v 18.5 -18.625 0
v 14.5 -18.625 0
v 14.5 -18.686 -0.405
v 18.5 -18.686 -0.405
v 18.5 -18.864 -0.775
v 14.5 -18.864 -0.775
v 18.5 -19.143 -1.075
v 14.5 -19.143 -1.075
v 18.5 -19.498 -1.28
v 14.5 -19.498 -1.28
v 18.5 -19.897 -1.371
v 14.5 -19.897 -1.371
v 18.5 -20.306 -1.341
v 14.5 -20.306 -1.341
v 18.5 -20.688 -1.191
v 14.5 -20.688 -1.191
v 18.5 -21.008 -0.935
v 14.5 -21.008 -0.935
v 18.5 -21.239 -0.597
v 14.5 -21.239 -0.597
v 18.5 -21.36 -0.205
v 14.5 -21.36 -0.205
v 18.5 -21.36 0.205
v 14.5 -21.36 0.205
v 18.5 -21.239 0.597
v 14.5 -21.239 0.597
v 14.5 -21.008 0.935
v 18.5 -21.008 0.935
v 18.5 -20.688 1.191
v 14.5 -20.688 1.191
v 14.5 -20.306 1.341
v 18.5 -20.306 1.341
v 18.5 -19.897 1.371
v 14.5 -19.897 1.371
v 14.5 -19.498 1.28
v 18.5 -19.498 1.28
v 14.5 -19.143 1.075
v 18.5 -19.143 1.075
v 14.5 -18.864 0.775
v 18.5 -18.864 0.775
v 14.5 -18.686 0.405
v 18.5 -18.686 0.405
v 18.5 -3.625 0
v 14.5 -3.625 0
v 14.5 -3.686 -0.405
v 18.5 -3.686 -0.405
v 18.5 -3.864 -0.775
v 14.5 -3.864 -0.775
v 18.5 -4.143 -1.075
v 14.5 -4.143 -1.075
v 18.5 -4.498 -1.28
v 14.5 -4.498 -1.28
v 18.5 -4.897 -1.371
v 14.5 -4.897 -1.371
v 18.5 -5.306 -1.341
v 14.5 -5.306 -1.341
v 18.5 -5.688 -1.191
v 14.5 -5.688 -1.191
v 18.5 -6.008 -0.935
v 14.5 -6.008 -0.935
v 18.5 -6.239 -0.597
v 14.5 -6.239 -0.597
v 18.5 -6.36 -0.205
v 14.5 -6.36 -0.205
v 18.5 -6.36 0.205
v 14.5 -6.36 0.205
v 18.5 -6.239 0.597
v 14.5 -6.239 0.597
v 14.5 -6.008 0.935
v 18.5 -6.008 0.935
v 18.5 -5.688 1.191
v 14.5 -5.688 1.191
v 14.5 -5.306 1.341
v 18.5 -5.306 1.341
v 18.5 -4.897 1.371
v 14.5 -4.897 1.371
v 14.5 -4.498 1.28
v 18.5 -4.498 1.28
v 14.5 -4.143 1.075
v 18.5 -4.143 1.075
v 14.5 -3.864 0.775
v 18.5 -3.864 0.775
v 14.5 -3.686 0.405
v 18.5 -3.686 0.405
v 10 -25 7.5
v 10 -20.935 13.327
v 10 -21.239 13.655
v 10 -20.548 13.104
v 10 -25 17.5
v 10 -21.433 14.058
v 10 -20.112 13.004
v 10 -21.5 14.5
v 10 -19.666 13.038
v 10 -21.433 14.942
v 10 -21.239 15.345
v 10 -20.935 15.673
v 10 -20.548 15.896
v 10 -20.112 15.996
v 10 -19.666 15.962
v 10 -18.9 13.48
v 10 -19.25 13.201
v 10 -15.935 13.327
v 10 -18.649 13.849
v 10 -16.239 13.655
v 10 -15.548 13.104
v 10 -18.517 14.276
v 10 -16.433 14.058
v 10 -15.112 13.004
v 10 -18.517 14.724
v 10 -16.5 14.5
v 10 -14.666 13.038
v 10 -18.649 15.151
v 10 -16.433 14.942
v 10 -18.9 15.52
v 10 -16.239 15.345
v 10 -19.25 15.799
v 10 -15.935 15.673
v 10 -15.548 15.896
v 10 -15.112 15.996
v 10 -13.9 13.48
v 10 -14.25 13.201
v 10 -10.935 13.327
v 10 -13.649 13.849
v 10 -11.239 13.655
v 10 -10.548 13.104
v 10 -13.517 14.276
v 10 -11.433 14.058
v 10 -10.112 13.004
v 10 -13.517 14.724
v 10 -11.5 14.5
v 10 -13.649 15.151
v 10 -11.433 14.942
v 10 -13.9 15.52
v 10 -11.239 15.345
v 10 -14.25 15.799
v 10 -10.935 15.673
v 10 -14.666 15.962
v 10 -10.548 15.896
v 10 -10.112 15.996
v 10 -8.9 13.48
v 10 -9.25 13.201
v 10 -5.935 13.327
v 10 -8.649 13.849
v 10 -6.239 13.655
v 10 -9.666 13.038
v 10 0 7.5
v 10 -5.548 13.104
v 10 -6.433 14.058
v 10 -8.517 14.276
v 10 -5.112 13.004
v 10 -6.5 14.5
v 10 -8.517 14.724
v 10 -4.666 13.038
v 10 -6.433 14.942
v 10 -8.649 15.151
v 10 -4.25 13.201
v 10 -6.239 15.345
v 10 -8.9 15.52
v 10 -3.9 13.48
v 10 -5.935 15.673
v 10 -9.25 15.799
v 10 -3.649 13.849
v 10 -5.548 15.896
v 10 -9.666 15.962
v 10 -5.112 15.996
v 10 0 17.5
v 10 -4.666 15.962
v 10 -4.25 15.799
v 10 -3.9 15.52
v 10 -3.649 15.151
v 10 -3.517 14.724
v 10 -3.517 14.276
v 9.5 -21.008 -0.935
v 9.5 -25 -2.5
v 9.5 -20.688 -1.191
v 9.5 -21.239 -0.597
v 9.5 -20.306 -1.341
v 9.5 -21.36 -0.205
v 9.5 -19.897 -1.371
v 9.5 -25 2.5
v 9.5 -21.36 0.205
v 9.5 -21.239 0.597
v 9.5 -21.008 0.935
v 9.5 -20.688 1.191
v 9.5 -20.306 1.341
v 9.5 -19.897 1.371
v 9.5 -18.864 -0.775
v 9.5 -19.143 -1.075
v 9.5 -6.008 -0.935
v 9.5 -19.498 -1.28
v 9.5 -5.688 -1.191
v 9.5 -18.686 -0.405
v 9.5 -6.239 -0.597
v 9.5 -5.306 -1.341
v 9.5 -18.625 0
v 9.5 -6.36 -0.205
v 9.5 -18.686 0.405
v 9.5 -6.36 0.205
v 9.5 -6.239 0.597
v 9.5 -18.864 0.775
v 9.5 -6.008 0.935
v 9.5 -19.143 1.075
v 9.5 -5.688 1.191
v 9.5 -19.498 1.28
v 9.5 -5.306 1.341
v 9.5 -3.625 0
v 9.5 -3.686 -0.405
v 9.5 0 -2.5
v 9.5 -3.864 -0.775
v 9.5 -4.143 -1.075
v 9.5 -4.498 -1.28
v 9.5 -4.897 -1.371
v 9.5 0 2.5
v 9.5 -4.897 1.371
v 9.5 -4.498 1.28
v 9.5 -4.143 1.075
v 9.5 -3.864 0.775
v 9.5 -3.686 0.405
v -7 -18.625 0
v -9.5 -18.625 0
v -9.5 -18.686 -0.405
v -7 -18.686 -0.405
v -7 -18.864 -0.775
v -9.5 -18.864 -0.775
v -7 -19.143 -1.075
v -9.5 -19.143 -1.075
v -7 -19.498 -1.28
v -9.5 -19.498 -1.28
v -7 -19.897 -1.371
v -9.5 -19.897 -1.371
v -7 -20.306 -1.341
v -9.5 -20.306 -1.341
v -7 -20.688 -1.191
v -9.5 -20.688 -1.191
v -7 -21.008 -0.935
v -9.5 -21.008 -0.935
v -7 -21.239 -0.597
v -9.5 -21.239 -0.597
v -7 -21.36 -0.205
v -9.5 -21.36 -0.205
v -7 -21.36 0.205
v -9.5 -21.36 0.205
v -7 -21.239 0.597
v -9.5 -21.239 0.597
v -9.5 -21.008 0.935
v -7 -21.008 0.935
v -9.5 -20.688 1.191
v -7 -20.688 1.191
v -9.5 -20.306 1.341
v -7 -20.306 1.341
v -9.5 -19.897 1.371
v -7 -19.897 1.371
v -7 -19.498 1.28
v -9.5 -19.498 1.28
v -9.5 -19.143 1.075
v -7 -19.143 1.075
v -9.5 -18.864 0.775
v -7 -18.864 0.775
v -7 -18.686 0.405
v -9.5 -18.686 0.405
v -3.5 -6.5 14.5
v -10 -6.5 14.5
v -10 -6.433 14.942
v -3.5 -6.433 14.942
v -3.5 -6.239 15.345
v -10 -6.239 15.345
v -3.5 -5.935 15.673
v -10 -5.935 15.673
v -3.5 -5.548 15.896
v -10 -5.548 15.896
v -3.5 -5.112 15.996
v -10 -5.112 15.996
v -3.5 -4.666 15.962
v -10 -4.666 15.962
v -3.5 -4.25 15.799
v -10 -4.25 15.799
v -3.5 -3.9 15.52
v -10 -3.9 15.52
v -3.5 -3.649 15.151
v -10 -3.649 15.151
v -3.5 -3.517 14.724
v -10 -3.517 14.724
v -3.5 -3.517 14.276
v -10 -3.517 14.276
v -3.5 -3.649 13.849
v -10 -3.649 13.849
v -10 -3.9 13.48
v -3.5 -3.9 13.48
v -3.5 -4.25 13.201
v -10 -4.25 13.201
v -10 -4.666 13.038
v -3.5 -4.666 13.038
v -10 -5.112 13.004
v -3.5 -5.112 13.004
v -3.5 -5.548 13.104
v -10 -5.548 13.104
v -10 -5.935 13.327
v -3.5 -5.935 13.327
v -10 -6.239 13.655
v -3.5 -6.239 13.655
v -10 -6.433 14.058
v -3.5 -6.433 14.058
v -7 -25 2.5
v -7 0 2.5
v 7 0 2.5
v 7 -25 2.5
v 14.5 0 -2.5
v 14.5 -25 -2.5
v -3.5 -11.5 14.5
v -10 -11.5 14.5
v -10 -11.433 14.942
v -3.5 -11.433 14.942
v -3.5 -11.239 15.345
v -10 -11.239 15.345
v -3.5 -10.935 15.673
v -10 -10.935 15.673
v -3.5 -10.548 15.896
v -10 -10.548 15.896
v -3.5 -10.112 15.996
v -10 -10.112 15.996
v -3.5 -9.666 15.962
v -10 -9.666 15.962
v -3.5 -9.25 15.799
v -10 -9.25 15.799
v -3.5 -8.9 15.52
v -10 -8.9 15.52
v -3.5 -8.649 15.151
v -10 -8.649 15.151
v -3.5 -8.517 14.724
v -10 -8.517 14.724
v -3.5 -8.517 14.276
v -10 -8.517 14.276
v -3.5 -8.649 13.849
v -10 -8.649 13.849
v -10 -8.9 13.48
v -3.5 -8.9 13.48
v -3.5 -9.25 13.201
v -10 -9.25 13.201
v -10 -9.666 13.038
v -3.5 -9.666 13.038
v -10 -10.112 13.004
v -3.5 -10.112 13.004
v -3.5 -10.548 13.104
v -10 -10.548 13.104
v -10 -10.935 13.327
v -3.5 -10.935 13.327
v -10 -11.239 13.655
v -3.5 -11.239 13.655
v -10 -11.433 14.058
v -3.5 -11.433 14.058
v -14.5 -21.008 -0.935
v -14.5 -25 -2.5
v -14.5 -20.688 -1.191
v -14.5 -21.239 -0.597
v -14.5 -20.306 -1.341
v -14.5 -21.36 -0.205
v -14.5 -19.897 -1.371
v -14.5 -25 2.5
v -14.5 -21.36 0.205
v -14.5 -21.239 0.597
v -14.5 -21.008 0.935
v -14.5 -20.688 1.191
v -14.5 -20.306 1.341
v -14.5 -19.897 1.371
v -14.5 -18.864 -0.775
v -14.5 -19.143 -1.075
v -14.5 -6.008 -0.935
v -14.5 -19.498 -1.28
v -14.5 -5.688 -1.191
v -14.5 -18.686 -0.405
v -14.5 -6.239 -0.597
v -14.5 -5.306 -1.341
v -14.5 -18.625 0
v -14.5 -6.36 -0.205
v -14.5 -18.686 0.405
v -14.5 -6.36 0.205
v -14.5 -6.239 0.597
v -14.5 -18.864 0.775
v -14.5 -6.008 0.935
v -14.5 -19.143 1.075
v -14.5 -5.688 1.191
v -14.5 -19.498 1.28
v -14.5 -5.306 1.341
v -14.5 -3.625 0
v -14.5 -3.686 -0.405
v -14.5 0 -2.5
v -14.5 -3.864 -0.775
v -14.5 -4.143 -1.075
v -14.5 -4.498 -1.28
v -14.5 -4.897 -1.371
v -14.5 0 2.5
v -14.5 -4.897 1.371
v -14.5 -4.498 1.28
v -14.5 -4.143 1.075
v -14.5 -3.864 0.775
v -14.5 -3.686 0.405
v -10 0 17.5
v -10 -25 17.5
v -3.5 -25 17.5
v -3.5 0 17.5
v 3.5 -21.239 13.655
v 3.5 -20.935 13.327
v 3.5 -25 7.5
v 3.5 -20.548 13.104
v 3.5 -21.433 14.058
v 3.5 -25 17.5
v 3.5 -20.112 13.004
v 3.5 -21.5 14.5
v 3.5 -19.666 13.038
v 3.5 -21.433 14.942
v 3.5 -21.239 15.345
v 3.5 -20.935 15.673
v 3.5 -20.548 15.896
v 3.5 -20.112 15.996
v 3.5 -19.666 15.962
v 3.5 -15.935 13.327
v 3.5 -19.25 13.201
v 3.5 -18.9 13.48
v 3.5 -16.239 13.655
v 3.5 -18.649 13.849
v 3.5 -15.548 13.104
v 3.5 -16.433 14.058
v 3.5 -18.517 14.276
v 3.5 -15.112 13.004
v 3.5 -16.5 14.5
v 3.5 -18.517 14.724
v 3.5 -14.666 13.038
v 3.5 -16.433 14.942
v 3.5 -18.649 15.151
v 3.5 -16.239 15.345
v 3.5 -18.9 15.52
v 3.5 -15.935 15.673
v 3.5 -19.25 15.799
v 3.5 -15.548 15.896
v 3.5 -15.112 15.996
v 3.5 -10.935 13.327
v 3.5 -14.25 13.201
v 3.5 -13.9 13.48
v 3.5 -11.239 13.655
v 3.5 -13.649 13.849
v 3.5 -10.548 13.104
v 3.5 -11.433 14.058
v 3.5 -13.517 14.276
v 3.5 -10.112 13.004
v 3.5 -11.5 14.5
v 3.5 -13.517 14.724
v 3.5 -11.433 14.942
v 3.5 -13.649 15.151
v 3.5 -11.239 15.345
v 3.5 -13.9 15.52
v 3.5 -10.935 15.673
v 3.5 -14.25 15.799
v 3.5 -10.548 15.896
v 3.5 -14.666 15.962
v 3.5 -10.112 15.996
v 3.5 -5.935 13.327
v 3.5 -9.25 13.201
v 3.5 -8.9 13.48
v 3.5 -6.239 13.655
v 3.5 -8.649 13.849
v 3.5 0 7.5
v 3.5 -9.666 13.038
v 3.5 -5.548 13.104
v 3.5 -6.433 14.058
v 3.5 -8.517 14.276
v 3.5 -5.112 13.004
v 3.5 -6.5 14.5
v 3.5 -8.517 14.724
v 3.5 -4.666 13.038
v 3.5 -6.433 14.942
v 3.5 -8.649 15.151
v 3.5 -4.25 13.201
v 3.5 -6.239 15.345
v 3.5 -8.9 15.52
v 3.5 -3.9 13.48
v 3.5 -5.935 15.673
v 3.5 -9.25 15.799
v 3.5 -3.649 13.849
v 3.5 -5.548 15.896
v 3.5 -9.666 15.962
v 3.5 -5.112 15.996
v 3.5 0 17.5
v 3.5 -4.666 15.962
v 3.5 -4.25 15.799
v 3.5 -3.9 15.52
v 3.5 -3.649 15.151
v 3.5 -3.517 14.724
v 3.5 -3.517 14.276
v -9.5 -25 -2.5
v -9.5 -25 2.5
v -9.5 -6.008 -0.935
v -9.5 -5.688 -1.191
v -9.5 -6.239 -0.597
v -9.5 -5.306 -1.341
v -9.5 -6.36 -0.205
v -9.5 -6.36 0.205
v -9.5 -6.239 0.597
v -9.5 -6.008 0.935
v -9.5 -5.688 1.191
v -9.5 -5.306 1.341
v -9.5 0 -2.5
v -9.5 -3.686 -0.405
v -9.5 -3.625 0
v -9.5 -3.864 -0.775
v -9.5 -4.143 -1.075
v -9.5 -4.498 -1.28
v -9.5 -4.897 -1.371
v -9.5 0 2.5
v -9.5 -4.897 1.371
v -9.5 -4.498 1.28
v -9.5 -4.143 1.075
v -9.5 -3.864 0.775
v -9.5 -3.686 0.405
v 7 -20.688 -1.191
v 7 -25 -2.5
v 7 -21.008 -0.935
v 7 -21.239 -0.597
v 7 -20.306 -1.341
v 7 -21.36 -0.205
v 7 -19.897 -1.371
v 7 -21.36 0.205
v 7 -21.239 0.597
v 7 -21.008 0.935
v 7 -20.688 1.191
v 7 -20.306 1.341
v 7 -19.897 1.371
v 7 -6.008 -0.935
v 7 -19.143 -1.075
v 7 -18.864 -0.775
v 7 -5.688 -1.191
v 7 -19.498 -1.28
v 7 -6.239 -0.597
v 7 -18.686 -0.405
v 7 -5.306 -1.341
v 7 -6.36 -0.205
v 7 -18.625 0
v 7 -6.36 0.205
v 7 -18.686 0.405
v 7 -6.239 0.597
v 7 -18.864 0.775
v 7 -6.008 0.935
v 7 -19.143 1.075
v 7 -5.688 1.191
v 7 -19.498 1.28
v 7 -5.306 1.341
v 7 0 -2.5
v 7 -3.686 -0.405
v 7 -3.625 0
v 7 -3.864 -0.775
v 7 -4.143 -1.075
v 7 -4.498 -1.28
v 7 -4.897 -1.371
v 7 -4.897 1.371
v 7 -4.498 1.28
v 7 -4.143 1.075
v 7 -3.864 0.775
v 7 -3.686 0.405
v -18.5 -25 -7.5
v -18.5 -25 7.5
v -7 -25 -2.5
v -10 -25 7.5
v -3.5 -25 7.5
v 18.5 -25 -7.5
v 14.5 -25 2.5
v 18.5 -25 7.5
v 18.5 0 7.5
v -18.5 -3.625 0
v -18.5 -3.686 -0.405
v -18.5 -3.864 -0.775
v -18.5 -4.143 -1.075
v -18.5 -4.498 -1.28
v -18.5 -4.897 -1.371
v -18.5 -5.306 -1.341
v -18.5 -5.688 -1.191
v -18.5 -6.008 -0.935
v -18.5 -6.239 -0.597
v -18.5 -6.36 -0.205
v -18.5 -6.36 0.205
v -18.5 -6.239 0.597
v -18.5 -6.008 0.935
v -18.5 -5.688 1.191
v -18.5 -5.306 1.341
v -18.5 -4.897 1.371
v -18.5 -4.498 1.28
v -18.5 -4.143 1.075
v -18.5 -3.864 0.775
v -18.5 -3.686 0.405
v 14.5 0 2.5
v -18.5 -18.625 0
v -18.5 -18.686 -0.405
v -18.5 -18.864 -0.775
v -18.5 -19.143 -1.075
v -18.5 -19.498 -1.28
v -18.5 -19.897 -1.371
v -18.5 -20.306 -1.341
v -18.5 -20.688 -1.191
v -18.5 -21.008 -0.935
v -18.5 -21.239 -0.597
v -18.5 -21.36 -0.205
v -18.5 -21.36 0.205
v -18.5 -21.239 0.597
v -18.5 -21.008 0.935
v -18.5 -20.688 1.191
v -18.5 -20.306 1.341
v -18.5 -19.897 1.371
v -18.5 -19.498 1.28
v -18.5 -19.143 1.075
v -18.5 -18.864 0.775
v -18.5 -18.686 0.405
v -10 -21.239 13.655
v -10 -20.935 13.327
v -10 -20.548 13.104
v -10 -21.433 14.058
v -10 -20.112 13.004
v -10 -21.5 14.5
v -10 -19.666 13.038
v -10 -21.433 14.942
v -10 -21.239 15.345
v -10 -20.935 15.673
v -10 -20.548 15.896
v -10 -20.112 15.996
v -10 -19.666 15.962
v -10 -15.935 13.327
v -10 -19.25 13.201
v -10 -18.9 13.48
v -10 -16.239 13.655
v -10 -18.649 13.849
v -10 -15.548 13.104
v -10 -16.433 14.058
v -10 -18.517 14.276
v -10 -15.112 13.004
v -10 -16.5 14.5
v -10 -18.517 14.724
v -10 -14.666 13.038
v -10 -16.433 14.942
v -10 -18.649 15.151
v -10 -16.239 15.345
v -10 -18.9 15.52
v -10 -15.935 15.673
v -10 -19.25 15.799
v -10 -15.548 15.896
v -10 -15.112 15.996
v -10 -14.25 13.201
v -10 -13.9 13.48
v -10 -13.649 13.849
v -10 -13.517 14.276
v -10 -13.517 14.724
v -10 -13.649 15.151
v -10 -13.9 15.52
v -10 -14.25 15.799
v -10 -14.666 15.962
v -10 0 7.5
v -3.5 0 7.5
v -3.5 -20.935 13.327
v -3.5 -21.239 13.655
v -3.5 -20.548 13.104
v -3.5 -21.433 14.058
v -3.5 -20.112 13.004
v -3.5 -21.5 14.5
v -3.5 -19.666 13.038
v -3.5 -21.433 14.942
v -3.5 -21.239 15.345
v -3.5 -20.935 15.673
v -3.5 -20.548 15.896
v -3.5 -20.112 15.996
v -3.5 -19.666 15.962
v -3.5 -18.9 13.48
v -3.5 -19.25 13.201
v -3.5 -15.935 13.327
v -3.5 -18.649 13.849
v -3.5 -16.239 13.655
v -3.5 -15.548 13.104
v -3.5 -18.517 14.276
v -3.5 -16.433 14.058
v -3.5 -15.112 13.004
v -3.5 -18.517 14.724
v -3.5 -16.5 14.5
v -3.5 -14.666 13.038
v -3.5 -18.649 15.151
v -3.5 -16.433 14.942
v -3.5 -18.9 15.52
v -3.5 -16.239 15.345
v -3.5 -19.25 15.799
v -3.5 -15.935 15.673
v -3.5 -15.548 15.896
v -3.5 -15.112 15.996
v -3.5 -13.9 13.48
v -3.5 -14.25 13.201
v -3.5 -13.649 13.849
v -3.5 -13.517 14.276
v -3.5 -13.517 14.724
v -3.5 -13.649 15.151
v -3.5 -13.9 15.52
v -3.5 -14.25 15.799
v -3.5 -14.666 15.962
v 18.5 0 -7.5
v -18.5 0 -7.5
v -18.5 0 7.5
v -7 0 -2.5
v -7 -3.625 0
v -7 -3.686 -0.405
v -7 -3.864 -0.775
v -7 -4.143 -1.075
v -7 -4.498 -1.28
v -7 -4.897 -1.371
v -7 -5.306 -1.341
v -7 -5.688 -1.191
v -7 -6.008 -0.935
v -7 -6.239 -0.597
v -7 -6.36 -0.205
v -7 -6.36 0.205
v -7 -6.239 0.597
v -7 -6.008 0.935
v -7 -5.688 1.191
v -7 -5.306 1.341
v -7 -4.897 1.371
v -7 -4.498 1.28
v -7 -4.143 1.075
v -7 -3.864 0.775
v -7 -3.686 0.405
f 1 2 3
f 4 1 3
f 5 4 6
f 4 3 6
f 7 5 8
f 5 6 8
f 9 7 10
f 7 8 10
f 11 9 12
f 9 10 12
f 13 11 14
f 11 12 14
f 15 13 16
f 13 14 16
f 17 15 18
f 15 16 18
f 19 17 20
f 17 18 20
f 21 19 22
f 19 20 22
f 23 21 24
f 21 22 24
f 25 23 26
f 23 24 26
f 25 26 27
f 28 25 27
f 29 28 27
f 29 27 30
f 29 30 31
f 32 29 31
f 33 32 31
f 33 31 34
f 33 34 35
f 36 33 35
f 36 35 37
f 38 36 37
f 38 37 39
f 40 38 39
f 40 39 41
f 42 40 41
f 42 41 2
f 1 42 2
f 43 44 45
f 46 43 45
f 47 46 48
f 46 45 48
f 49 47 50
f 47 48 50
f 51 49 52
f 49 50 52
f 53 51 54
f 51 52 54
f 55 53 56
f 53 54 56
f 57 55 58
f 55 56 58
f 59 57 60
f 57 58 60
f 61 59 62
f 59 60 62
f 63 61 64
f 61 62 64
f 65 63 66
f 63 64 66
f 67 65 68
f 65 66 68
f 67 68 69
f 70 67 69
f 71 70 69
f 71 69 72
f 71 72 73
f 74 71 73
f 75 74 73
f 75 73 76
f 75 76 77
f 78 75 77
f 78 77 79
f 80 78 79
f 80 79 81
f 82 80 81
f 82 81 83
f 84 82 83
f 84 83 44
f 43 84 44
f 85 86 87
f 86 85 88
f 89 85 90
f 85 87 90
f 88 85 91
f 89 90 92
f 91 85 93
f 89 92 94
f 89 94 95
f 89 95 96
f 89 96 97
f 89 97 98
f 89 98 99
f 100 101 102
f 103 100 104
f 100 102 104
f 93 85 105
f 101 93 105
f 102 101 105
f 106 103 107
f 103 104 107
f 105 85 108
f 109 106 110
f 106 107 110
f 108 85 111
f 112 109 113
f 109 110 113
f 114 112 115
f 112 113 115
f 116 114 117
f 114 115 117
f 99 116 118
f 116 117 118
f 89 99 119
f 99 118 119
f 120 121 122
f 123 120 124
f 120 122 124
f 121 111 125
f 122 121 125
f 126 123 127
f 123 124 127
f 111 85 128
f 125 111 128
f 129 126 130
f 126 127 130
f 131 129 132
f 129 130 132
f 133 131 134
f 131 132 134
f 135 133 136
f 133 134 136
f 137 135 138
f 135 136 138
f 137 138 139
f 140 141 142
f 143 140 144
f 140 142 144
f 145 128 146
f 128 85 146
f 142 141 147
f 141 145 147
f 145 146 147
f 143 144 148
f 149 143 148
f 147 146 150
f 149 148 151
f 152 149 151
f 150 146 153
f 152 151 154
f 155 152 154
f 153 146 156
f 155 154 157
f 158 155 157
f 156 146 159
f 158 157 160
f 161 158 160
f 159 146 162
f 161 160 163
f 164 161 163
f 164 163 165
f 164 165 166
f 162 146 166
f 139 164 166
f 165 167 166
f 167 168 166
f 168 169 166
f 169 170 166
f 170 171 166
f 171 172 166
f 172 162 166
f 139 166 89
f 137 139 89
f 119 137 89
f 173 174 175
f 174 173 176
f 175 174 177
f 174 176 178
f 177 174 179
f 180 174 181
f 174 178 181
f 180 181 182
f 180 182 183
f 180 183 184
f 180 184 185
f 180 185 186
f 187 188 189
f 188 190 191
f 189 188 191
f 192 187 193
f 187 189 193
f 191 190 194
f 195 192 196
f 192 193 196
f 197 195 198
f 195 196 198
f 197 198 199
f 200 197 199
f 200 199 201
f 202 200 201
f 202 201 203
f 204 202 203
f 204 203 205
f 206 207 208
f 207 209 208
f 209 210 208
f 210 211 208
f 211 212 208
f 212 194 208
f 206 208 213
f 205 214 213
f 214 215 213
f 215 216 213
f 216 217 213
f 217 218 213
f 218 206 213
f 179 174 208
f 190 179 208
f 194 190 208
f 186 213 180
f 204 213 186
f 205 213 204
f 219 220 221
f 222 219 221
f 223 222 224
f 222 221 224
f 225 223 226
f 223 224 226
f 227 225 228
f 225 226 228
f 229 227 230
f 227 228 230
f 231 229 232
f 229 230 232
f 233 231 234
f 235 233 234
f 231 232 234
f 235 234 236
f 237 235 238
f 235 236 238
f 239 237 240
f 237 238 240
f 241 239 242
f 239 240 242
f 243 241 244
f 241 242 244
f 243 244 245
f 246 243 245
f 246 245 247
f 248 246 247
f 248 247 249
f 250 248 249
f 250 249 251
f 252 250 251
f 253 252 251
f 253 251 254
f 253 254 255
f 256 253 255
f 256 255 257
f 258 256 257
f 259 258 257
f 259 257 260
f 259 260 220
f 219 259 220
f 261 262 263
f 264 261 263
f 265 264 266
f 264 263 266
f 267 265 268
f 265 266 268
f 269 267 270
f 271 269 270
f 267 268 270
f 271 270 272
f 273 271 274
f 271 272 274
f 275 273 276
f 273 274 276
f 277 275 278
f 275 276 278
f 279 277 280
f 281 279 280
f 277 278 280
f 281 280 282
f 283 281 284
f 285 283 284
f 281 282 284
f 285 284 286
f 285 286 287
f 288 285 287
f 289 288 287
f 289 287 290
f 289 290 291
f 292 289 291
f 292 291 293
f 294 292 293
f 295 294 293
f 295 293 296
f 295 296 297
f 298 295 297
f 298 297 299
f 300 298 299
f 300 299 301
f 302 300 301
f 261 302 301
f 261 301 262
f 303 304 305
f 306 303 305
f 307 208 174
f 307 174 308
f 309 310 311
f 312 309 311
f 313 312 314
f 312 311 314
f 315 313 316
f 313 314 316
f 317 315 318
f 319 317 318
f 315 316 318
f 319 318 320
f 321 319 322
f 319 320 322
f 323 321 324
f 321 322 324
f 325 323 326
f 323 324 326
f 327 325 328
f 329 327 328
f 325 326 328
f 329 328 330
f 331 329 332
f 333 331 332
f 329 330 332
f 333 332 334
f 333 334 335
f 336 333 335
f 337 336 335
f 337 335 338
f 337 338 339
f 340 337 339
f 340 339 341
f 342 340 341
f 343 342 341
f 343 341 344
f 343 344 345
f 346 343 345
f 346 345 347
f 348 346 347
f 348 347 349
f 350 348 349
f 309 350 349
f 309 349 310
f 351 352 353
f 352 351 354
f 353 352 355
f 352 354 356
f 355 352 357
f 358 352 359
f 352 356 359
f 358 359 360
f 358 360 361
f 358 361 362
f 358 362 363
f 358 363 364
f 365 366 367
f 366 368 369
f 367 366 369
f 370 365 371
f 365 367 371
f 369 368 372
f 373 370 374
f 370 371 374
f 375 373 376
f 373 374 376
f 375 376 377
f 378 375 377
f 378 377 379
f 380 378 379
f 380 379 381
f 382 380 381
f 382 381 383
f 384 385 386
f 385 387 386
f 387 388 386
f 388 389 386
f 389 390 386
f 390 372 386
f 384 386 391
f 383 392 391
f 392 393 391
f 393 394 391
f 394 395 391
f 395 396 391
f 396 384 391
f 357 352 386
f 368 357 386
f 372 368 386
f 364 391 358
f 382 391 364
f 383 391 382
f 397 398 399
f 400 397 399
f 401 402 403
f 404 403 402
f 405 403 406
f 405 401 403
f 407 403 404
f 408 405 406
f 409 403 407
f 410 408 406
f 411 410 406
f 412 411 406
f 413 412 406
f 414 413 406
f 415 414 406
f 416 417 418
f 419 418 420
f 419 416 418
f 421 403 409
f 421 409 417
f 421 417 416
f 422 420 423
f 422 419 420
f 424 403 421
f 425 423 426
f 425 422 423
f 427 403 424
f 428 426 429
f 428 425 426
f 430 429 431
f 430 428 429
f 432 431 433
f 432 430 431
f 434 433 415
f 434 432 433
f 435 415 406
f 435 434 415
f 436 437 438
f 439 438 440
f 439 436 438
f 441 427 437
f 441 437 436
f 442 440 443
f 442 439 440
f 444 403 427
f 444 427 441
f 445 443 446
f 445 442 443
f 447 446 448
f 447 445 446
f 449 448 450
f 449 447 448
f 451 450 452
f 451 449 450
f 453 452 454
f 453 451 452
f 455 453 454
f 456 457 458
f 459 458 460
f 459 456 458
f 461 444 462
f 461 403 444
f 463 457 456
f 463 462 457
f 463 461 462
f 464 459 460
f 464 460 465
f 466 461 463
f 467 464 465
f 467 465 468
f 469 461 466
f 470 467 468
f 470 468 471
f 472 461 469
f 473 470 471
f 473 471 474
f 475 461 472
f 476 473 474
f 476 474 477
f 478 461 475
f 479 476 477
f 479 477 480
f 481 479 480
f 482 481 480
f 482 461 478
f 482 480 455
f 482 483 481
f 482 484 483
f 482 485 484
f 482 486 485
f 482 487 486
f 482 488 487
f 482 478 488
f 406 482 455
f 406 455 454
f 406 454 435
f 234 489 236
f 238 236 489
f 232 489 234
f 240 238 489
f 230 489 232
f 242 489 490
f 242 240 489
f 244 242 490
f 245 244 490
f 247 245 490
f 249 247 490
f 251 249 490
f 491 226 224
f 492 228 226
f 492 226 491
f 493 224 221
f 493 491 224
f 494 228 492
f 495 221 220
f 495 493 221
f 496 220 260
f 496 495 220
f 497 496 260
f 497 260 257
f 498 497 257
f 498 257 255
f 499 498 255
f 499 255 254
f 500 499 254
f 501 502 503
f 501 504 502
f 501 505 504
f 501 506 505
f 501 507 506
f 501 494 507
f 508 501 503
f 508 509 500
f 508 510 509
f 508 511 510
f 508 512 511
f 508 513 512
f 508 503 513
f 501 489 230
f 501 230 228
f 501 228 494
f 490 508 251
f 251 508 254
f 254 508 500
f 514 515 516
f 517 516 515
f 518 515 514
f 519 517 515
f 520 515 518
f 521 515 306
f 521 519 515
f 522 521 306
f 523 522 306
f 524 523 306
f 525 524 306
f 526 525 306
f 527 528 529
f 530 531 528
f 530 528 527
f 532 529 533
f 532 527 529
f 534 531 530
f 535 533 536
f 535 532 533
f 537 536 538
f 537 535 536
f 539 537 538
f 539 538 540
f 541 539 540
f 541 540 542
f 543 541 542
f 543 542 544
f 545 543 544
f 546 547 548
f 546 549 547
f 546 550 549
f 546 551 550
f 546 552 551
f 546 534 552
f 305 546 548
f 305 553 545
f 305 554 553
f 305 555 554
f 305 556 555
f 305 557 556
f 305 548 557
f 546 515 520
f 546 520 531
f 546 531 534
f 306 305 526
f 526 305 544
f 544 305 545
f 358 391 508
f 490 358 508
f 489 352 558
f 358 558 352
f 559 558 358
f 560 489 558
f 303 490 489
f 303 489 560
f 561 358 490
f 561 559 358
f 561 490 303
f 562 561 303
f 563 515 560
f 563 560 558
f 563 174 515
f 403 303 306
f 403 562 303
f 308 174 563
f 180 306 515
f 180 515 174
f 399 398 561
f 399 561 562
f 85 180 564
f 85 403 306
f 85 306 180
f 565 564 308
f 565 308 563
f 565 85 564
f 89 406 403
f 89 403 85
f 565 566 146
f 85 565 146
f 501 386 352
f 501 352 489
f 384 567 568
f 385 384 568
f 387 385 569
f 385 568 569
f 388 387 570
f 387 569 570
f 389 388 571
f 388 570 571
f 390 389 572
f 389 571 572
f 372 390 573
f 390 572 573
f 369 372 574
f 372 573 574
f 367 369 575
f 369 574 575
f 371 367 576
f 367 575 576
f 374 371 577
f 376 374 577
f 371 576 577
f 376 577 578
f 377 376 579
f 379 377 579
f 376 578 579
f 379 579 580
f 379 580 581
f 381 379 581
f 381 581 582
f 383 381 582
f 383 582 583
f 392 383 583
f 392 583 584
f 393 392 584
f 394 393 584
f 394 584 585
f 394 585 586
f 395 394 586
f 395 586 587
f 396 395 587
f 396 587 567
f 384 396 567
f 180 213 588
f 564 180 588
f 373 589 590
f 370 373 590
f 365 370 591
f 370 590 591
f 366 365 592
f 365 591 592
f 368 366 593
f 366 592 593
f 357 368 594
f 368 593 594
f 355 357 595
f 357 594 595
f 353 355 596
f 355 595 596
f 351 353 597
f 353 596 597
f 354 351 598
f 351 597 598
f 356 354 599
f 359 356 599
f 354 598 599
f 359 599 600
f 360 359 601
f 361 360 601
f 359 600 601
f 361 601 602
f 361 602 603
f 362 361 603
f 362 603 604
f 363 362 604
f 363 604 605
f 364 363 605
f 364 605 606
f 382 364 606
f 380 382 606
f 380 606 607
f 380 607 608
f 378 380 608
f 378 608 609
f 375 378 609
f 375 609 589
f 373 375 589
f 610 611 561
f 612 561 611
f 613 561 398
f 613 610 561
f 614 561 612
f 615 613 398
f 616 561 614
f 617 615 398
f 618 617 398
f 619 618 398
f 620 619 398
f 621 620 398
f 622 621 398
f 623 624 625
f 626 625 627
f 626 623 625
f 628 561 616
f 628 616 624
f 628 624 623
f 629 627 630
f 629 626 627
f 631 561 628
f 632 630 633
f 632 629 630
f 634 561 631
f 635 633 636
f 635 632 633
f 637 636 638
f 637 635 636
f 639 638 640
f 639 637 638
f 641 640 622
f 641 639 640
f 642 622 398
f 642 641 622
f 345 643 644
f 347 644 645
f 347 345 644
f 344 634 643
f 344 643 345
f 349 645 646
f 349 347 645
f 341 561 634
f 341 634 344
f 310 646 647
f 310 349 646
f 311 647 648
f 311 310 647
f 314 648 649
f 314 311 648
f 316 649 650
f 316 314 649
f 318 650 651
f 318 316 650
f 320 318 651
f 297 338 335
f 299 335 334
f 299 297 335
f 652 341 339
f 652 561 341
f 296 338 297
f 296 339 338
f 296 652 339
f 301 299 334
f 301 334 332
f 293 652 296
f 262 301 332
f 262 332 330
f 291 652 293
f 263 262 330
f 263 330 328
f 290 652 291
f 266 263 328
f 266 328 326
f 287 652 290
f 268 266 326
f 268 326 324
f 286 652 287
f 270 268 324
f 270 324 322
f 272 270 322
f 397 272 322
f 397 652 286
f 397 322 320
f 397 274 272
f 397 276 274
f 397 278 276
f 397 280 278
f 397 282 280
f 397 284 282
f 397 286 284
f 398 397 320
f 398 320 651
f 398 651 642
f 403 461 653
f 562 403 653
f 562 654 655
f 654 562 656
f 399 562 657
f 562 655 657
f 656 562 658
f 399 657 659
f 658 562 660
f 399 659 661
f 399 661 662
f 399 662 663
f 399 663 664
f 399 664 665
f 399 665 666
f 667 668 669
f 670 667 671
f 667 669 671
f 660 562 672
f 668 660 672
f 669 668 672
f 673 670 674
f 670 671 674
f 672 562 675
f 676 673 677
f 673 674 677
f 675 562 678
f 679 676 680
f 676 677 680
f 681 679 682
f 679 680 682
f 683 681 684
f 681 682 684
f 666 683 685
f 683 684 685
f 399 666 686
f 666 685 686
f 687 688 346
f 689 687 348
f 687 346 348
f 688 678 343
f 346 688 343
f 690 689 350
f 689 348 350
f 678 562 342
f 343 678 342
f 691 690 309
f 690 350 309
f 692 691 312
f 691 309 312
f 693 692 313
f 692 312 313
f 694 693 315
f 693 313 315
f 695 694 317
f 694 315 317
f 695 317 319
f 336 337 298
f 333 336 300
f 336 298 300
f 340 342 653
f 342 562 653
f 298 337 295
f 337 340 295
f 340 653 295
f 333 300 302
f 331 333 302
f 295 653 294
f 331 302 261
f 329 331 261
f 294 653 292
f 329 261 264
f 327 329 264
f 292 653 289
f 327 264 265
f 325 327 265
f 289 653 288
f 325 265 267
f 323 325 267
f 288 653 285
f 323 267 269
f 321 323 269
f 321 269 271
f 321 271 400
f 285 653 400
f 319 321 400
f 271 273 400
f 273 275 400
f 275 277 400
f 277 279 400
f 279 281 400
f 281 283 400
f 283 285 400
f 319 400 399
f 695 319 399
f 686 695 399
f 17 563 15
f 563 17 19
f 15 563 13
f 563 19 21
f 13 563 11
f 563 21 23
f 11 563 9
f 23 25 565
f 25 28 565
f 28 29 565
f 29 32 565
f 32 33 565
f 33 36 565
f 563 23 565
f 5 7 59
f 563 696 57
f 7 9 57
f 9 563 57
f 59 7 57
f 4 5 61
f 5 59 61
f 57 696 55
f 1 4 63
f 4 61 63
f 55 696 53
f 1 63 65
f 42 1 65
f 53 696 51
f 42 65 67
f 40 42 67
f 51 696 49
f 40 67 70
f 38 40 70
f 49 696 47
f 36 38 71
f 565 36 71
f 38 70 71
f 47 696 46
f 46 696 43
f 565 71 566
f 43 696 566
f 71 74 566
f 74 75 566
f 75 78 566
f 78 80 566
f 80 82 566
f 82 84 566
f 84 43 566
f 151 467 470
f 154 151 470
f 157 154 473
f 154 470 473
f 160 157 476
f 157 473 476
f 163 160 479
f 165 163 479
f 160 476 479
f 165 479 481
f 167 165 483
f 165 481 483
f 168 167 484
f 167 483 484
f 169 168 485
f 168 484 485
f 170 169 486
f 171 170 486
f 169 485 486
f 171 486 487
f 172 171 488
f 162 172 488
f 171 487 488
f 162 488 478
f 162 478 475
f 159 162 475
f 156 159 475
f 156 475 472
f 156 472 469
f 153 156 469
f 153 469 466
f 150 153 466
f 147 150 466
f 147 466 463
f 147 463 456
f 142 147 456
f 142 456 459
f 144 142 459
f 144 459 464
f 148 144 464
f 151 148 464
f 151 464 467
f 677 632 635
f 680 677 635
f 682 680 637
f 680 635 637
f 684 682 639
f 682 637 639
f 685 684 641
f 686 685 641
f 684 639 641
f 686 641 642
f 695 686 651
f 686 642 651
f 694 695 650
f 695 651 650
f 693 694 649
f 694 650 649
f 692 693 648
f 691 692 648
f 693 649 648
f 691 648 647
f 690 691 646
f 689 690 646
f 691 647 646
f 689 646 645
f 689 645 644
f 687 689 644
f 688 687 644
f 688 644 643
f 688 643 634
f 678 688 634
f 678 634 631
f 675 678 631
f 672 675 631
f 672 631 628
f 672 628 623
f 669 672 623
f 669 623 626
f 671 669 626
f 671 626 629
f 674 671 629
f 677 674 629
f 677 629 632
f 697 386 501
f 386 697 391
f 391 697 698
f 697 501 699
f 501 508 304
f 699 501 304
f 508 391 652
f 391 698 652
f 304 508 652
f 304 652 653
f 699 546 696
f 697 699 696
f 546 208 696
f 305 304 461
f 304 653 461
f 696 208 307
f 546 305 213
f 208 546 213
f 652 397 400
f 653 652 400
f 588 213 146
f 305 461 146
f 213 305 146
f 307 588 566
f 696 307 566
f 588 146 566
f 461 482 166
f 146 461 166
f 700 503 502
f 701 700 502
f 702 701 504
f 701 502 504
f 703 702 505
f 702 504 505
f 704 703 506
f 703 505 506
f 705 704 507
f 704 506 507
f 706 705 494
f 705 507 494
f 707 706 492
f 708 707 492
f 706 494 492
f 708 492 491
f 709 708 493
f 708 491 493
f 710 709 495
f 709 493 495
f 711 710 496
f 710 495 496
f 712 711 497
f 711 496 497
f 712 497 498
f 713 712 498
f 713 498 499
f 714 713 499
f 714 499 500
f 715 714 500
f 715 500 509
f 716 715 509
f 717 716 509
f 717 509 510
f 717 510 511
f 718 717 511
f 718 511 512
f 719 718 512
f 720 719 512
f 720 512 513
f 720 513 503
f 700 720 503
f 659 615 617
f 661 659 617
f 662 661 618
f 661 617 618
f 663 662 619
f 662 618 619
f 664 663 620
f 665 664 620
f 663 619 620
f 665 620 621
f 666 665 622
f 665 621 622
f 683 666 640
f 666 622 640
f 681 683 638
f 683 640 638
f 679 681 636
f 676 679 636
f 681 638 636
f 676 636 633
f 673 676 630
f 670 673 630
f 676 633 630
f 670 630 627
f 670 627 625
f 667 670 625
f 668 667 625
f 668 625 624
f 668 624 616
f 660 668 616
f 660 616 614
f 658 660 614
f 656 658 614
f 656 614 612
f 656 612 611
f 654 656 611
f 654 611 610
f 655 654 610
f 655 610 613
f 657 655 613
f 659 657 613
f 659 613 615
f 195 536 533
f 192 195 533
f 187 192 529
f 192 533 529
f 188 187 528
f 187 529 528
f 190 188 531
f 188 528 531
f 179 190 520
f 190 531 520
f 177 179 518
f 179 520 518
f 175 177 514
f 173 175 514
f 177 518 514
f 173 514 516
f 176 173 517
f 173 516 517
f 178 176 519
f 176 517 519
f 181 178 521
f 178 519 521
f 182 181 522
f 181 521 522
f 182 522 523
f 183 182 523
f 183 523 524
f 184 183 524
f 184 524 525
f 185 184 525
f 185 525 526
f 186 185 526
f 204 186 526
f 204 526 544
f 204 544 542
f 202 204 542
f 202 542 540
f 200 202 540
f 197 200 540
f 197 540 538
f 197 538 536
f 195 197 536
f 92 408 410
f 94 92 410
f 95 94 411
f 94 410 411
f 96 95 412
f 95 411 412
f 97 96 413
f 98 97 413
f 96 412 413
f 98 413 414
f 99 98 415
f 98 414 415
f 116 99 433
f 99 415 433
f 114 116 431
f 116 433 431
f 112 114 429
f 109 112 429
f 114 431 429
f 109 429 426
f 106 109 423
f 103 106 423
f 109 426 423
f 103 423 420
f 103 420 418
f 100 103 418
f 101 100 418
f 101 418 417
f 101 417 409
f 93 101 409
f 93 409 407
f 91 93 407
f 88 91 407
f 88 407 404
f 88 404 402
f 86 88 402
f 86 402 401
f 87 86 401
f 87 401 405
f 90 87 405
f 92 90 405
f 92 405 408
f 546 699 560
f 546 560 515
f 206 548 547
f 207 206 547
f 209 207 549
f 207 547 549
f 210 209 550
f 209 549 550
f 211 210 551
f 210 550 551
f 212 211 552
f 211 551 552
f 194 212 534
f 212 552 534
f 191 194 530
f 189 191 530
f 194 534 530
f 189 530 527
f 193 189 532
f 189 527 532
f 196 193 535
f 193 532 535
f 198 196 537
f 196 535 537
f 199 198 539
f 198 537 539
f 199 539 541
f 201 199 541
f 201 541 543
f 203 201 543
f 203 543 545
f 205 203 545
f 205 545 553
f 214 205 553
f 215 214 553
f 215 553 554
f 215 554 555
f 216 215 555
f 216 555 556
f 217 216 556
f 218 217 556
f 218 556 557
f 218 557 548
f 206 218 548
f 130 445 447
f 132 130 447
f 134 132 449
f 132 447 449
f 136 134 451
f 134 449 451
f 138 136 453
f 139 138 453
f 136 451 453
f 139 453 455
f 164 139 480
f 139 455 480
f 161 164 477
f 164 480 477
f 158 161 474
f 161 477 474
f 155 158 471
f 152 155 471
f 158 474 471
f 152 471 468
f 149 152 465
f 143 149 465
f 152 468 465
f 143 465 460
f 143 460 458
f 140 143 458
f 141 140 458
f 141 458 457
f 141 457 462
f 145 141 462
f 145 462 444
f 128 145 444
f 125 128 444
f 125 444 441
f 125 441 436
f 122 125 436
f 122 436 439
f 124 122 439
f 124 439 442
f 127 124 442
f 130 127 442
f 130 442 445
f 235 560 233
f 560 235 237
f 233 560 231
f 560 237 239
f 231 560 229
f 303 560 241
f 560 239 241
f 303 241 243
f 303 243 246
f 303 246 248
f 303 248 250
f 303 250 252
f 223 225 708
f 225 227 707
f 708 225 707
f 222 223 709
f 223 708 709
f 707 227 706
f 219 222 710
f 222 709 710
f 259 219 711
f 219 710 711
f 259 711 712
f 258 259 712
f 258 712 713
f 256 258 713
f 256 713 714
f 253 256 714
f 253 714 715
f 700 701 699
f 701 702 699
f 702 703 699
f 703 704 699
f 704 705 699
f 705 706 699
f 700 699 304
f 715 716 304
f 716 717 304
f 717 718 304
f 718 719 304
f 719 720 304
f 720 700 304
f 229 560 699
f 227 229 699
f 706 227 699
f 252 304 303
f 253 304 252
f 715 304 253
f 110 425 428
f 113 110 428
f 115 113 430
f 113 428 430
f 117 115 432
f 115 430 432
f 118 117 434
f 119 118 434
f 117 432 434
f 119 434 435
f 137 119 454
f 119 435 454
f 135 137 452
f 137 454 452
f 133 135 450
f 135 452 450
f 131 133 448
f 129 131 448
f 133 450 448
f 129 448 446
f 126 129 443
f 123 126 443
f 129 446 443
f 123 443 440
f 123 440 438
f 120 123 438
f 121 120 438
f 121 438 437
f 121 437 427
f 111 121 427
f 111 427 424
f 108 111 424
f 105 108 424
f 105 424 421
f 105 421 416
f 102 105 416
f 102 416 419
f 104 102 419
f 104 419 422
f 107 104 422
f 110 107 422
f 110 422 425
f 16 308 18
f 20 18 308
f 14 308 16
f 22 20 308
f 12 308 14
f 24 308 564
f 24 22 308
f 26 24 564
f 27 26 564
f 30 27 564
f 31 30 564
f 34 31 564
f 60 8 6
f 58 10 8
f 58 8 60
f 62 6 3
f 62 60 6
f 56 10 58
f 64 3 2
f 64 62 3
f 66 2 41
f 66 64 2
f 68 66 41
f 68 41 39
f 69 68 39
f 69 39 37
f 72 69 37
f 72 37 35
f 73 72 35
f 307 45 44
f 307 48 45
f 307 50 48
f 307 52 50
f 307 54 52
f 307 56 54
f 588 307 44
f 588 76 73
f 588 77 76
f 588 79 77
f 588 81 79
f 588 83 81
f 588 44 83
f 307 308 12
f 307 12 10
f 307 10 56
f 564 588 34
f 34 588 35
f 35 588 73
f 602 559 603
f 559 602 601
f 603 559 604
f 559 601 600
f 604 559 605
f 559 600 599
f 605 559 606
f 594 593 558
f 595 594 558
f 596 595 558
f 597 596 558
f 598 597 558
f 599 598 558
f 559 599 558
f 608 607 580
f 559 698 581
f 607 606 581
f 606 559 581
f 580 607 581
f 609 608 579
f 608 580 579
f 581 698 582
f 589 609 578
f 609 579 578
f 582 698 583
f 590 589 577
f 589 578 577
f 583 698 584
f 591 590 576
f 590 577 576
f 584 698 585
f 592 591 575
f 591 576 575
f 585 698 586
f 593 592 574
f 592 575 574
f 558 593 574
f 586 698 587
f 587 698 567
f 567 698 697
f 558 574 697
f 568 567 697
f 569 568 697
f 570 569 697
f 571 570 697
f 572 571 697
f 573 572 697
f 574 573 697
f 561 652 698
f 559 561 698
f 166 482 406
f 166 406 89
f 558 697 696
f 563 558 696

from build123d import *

# Parameters (mm, degrees)
F0_W     = 5
F0_H     = 5
F0_W_2   = 14
F0_W_3   = 6.5
F0_H_2   = 10
F1_DEPTH = 25
F2_R     = 1.5
F3_DEPTH = 37


with BuildPart() as f1:
    # F0 (on Front) → F1 (new body)
    with BuildSketch(Plane.XZ):
        Polygon((-18.5, -7.5), (18.5, -7.5), (18.5, 7.5), (10, 7.5), (3.5, 7.5), (-3.5, 7.5), (-10, 7.5), (-18.5, 7.5), align=None)
        with Locations((-12, 0)):
            Rectangle(F0_W, F0_H, mode=Mode.SUBTRACT)
        Rectangle(F0_W_2, F0_H, mode=Mode.SUBTRACT)
        with Locations((12, 0)):
            Rectangle(F0_W, F0_H, mode=Mode.SUBTRACT)
        with Locations((6.75, 12.5)):
            Rectangle(F0_W_3, F0_H_2)
        with Locations((-6.75, 12.5)):
            Rectangle(F0_W_3, F0_H_2)
    extrude(amount=F1_DEPTH)

    # F2 (on face) → F3 (cut, through all)
    with BuildSketch(Plane(origin=(-18.5, 0, 0), x_dir=(0, -1, 0), z_dir=(-1, 0, 0))):
        with Locations((5, 14.5)):
            Circle(F2_R)
        with Locations((10, 14.5)):
            Circle(F2_R)
        with Locations((15, 14.5)):
            Circle(F2_R)
        with Locations((20, 14.5)):
            Circle(F2_R)
        with BuildLine():
            Line((18.625, 0), (21.375, 0))
            ThreePointArc((21.375, 0), (20, 1.375), (18.625, 0))
        make_face()
        with BuildLine():
            Line((3.625, 0), (6.375, 0))
            ThreePointArc((6.375, 0), (5, 1.375), (3.625, 0))
        make_face()
        with BuildLine():
            ThreePointArc((3.625, 0), (5, -1.375), (6.375, 0))
            Line((6.375, 0), (3.625, 0))
        make_face()
        with BuildLine():
            ThreePointArc((18.625, 0), (20, -1.375), (21.375, 0))
            Line((21.375, 0), (18.625, 0))
        make_face()
    extrude(amount=-F3_DEPTH, mode=Mode.SUBTRACT)


solid = f1.part
